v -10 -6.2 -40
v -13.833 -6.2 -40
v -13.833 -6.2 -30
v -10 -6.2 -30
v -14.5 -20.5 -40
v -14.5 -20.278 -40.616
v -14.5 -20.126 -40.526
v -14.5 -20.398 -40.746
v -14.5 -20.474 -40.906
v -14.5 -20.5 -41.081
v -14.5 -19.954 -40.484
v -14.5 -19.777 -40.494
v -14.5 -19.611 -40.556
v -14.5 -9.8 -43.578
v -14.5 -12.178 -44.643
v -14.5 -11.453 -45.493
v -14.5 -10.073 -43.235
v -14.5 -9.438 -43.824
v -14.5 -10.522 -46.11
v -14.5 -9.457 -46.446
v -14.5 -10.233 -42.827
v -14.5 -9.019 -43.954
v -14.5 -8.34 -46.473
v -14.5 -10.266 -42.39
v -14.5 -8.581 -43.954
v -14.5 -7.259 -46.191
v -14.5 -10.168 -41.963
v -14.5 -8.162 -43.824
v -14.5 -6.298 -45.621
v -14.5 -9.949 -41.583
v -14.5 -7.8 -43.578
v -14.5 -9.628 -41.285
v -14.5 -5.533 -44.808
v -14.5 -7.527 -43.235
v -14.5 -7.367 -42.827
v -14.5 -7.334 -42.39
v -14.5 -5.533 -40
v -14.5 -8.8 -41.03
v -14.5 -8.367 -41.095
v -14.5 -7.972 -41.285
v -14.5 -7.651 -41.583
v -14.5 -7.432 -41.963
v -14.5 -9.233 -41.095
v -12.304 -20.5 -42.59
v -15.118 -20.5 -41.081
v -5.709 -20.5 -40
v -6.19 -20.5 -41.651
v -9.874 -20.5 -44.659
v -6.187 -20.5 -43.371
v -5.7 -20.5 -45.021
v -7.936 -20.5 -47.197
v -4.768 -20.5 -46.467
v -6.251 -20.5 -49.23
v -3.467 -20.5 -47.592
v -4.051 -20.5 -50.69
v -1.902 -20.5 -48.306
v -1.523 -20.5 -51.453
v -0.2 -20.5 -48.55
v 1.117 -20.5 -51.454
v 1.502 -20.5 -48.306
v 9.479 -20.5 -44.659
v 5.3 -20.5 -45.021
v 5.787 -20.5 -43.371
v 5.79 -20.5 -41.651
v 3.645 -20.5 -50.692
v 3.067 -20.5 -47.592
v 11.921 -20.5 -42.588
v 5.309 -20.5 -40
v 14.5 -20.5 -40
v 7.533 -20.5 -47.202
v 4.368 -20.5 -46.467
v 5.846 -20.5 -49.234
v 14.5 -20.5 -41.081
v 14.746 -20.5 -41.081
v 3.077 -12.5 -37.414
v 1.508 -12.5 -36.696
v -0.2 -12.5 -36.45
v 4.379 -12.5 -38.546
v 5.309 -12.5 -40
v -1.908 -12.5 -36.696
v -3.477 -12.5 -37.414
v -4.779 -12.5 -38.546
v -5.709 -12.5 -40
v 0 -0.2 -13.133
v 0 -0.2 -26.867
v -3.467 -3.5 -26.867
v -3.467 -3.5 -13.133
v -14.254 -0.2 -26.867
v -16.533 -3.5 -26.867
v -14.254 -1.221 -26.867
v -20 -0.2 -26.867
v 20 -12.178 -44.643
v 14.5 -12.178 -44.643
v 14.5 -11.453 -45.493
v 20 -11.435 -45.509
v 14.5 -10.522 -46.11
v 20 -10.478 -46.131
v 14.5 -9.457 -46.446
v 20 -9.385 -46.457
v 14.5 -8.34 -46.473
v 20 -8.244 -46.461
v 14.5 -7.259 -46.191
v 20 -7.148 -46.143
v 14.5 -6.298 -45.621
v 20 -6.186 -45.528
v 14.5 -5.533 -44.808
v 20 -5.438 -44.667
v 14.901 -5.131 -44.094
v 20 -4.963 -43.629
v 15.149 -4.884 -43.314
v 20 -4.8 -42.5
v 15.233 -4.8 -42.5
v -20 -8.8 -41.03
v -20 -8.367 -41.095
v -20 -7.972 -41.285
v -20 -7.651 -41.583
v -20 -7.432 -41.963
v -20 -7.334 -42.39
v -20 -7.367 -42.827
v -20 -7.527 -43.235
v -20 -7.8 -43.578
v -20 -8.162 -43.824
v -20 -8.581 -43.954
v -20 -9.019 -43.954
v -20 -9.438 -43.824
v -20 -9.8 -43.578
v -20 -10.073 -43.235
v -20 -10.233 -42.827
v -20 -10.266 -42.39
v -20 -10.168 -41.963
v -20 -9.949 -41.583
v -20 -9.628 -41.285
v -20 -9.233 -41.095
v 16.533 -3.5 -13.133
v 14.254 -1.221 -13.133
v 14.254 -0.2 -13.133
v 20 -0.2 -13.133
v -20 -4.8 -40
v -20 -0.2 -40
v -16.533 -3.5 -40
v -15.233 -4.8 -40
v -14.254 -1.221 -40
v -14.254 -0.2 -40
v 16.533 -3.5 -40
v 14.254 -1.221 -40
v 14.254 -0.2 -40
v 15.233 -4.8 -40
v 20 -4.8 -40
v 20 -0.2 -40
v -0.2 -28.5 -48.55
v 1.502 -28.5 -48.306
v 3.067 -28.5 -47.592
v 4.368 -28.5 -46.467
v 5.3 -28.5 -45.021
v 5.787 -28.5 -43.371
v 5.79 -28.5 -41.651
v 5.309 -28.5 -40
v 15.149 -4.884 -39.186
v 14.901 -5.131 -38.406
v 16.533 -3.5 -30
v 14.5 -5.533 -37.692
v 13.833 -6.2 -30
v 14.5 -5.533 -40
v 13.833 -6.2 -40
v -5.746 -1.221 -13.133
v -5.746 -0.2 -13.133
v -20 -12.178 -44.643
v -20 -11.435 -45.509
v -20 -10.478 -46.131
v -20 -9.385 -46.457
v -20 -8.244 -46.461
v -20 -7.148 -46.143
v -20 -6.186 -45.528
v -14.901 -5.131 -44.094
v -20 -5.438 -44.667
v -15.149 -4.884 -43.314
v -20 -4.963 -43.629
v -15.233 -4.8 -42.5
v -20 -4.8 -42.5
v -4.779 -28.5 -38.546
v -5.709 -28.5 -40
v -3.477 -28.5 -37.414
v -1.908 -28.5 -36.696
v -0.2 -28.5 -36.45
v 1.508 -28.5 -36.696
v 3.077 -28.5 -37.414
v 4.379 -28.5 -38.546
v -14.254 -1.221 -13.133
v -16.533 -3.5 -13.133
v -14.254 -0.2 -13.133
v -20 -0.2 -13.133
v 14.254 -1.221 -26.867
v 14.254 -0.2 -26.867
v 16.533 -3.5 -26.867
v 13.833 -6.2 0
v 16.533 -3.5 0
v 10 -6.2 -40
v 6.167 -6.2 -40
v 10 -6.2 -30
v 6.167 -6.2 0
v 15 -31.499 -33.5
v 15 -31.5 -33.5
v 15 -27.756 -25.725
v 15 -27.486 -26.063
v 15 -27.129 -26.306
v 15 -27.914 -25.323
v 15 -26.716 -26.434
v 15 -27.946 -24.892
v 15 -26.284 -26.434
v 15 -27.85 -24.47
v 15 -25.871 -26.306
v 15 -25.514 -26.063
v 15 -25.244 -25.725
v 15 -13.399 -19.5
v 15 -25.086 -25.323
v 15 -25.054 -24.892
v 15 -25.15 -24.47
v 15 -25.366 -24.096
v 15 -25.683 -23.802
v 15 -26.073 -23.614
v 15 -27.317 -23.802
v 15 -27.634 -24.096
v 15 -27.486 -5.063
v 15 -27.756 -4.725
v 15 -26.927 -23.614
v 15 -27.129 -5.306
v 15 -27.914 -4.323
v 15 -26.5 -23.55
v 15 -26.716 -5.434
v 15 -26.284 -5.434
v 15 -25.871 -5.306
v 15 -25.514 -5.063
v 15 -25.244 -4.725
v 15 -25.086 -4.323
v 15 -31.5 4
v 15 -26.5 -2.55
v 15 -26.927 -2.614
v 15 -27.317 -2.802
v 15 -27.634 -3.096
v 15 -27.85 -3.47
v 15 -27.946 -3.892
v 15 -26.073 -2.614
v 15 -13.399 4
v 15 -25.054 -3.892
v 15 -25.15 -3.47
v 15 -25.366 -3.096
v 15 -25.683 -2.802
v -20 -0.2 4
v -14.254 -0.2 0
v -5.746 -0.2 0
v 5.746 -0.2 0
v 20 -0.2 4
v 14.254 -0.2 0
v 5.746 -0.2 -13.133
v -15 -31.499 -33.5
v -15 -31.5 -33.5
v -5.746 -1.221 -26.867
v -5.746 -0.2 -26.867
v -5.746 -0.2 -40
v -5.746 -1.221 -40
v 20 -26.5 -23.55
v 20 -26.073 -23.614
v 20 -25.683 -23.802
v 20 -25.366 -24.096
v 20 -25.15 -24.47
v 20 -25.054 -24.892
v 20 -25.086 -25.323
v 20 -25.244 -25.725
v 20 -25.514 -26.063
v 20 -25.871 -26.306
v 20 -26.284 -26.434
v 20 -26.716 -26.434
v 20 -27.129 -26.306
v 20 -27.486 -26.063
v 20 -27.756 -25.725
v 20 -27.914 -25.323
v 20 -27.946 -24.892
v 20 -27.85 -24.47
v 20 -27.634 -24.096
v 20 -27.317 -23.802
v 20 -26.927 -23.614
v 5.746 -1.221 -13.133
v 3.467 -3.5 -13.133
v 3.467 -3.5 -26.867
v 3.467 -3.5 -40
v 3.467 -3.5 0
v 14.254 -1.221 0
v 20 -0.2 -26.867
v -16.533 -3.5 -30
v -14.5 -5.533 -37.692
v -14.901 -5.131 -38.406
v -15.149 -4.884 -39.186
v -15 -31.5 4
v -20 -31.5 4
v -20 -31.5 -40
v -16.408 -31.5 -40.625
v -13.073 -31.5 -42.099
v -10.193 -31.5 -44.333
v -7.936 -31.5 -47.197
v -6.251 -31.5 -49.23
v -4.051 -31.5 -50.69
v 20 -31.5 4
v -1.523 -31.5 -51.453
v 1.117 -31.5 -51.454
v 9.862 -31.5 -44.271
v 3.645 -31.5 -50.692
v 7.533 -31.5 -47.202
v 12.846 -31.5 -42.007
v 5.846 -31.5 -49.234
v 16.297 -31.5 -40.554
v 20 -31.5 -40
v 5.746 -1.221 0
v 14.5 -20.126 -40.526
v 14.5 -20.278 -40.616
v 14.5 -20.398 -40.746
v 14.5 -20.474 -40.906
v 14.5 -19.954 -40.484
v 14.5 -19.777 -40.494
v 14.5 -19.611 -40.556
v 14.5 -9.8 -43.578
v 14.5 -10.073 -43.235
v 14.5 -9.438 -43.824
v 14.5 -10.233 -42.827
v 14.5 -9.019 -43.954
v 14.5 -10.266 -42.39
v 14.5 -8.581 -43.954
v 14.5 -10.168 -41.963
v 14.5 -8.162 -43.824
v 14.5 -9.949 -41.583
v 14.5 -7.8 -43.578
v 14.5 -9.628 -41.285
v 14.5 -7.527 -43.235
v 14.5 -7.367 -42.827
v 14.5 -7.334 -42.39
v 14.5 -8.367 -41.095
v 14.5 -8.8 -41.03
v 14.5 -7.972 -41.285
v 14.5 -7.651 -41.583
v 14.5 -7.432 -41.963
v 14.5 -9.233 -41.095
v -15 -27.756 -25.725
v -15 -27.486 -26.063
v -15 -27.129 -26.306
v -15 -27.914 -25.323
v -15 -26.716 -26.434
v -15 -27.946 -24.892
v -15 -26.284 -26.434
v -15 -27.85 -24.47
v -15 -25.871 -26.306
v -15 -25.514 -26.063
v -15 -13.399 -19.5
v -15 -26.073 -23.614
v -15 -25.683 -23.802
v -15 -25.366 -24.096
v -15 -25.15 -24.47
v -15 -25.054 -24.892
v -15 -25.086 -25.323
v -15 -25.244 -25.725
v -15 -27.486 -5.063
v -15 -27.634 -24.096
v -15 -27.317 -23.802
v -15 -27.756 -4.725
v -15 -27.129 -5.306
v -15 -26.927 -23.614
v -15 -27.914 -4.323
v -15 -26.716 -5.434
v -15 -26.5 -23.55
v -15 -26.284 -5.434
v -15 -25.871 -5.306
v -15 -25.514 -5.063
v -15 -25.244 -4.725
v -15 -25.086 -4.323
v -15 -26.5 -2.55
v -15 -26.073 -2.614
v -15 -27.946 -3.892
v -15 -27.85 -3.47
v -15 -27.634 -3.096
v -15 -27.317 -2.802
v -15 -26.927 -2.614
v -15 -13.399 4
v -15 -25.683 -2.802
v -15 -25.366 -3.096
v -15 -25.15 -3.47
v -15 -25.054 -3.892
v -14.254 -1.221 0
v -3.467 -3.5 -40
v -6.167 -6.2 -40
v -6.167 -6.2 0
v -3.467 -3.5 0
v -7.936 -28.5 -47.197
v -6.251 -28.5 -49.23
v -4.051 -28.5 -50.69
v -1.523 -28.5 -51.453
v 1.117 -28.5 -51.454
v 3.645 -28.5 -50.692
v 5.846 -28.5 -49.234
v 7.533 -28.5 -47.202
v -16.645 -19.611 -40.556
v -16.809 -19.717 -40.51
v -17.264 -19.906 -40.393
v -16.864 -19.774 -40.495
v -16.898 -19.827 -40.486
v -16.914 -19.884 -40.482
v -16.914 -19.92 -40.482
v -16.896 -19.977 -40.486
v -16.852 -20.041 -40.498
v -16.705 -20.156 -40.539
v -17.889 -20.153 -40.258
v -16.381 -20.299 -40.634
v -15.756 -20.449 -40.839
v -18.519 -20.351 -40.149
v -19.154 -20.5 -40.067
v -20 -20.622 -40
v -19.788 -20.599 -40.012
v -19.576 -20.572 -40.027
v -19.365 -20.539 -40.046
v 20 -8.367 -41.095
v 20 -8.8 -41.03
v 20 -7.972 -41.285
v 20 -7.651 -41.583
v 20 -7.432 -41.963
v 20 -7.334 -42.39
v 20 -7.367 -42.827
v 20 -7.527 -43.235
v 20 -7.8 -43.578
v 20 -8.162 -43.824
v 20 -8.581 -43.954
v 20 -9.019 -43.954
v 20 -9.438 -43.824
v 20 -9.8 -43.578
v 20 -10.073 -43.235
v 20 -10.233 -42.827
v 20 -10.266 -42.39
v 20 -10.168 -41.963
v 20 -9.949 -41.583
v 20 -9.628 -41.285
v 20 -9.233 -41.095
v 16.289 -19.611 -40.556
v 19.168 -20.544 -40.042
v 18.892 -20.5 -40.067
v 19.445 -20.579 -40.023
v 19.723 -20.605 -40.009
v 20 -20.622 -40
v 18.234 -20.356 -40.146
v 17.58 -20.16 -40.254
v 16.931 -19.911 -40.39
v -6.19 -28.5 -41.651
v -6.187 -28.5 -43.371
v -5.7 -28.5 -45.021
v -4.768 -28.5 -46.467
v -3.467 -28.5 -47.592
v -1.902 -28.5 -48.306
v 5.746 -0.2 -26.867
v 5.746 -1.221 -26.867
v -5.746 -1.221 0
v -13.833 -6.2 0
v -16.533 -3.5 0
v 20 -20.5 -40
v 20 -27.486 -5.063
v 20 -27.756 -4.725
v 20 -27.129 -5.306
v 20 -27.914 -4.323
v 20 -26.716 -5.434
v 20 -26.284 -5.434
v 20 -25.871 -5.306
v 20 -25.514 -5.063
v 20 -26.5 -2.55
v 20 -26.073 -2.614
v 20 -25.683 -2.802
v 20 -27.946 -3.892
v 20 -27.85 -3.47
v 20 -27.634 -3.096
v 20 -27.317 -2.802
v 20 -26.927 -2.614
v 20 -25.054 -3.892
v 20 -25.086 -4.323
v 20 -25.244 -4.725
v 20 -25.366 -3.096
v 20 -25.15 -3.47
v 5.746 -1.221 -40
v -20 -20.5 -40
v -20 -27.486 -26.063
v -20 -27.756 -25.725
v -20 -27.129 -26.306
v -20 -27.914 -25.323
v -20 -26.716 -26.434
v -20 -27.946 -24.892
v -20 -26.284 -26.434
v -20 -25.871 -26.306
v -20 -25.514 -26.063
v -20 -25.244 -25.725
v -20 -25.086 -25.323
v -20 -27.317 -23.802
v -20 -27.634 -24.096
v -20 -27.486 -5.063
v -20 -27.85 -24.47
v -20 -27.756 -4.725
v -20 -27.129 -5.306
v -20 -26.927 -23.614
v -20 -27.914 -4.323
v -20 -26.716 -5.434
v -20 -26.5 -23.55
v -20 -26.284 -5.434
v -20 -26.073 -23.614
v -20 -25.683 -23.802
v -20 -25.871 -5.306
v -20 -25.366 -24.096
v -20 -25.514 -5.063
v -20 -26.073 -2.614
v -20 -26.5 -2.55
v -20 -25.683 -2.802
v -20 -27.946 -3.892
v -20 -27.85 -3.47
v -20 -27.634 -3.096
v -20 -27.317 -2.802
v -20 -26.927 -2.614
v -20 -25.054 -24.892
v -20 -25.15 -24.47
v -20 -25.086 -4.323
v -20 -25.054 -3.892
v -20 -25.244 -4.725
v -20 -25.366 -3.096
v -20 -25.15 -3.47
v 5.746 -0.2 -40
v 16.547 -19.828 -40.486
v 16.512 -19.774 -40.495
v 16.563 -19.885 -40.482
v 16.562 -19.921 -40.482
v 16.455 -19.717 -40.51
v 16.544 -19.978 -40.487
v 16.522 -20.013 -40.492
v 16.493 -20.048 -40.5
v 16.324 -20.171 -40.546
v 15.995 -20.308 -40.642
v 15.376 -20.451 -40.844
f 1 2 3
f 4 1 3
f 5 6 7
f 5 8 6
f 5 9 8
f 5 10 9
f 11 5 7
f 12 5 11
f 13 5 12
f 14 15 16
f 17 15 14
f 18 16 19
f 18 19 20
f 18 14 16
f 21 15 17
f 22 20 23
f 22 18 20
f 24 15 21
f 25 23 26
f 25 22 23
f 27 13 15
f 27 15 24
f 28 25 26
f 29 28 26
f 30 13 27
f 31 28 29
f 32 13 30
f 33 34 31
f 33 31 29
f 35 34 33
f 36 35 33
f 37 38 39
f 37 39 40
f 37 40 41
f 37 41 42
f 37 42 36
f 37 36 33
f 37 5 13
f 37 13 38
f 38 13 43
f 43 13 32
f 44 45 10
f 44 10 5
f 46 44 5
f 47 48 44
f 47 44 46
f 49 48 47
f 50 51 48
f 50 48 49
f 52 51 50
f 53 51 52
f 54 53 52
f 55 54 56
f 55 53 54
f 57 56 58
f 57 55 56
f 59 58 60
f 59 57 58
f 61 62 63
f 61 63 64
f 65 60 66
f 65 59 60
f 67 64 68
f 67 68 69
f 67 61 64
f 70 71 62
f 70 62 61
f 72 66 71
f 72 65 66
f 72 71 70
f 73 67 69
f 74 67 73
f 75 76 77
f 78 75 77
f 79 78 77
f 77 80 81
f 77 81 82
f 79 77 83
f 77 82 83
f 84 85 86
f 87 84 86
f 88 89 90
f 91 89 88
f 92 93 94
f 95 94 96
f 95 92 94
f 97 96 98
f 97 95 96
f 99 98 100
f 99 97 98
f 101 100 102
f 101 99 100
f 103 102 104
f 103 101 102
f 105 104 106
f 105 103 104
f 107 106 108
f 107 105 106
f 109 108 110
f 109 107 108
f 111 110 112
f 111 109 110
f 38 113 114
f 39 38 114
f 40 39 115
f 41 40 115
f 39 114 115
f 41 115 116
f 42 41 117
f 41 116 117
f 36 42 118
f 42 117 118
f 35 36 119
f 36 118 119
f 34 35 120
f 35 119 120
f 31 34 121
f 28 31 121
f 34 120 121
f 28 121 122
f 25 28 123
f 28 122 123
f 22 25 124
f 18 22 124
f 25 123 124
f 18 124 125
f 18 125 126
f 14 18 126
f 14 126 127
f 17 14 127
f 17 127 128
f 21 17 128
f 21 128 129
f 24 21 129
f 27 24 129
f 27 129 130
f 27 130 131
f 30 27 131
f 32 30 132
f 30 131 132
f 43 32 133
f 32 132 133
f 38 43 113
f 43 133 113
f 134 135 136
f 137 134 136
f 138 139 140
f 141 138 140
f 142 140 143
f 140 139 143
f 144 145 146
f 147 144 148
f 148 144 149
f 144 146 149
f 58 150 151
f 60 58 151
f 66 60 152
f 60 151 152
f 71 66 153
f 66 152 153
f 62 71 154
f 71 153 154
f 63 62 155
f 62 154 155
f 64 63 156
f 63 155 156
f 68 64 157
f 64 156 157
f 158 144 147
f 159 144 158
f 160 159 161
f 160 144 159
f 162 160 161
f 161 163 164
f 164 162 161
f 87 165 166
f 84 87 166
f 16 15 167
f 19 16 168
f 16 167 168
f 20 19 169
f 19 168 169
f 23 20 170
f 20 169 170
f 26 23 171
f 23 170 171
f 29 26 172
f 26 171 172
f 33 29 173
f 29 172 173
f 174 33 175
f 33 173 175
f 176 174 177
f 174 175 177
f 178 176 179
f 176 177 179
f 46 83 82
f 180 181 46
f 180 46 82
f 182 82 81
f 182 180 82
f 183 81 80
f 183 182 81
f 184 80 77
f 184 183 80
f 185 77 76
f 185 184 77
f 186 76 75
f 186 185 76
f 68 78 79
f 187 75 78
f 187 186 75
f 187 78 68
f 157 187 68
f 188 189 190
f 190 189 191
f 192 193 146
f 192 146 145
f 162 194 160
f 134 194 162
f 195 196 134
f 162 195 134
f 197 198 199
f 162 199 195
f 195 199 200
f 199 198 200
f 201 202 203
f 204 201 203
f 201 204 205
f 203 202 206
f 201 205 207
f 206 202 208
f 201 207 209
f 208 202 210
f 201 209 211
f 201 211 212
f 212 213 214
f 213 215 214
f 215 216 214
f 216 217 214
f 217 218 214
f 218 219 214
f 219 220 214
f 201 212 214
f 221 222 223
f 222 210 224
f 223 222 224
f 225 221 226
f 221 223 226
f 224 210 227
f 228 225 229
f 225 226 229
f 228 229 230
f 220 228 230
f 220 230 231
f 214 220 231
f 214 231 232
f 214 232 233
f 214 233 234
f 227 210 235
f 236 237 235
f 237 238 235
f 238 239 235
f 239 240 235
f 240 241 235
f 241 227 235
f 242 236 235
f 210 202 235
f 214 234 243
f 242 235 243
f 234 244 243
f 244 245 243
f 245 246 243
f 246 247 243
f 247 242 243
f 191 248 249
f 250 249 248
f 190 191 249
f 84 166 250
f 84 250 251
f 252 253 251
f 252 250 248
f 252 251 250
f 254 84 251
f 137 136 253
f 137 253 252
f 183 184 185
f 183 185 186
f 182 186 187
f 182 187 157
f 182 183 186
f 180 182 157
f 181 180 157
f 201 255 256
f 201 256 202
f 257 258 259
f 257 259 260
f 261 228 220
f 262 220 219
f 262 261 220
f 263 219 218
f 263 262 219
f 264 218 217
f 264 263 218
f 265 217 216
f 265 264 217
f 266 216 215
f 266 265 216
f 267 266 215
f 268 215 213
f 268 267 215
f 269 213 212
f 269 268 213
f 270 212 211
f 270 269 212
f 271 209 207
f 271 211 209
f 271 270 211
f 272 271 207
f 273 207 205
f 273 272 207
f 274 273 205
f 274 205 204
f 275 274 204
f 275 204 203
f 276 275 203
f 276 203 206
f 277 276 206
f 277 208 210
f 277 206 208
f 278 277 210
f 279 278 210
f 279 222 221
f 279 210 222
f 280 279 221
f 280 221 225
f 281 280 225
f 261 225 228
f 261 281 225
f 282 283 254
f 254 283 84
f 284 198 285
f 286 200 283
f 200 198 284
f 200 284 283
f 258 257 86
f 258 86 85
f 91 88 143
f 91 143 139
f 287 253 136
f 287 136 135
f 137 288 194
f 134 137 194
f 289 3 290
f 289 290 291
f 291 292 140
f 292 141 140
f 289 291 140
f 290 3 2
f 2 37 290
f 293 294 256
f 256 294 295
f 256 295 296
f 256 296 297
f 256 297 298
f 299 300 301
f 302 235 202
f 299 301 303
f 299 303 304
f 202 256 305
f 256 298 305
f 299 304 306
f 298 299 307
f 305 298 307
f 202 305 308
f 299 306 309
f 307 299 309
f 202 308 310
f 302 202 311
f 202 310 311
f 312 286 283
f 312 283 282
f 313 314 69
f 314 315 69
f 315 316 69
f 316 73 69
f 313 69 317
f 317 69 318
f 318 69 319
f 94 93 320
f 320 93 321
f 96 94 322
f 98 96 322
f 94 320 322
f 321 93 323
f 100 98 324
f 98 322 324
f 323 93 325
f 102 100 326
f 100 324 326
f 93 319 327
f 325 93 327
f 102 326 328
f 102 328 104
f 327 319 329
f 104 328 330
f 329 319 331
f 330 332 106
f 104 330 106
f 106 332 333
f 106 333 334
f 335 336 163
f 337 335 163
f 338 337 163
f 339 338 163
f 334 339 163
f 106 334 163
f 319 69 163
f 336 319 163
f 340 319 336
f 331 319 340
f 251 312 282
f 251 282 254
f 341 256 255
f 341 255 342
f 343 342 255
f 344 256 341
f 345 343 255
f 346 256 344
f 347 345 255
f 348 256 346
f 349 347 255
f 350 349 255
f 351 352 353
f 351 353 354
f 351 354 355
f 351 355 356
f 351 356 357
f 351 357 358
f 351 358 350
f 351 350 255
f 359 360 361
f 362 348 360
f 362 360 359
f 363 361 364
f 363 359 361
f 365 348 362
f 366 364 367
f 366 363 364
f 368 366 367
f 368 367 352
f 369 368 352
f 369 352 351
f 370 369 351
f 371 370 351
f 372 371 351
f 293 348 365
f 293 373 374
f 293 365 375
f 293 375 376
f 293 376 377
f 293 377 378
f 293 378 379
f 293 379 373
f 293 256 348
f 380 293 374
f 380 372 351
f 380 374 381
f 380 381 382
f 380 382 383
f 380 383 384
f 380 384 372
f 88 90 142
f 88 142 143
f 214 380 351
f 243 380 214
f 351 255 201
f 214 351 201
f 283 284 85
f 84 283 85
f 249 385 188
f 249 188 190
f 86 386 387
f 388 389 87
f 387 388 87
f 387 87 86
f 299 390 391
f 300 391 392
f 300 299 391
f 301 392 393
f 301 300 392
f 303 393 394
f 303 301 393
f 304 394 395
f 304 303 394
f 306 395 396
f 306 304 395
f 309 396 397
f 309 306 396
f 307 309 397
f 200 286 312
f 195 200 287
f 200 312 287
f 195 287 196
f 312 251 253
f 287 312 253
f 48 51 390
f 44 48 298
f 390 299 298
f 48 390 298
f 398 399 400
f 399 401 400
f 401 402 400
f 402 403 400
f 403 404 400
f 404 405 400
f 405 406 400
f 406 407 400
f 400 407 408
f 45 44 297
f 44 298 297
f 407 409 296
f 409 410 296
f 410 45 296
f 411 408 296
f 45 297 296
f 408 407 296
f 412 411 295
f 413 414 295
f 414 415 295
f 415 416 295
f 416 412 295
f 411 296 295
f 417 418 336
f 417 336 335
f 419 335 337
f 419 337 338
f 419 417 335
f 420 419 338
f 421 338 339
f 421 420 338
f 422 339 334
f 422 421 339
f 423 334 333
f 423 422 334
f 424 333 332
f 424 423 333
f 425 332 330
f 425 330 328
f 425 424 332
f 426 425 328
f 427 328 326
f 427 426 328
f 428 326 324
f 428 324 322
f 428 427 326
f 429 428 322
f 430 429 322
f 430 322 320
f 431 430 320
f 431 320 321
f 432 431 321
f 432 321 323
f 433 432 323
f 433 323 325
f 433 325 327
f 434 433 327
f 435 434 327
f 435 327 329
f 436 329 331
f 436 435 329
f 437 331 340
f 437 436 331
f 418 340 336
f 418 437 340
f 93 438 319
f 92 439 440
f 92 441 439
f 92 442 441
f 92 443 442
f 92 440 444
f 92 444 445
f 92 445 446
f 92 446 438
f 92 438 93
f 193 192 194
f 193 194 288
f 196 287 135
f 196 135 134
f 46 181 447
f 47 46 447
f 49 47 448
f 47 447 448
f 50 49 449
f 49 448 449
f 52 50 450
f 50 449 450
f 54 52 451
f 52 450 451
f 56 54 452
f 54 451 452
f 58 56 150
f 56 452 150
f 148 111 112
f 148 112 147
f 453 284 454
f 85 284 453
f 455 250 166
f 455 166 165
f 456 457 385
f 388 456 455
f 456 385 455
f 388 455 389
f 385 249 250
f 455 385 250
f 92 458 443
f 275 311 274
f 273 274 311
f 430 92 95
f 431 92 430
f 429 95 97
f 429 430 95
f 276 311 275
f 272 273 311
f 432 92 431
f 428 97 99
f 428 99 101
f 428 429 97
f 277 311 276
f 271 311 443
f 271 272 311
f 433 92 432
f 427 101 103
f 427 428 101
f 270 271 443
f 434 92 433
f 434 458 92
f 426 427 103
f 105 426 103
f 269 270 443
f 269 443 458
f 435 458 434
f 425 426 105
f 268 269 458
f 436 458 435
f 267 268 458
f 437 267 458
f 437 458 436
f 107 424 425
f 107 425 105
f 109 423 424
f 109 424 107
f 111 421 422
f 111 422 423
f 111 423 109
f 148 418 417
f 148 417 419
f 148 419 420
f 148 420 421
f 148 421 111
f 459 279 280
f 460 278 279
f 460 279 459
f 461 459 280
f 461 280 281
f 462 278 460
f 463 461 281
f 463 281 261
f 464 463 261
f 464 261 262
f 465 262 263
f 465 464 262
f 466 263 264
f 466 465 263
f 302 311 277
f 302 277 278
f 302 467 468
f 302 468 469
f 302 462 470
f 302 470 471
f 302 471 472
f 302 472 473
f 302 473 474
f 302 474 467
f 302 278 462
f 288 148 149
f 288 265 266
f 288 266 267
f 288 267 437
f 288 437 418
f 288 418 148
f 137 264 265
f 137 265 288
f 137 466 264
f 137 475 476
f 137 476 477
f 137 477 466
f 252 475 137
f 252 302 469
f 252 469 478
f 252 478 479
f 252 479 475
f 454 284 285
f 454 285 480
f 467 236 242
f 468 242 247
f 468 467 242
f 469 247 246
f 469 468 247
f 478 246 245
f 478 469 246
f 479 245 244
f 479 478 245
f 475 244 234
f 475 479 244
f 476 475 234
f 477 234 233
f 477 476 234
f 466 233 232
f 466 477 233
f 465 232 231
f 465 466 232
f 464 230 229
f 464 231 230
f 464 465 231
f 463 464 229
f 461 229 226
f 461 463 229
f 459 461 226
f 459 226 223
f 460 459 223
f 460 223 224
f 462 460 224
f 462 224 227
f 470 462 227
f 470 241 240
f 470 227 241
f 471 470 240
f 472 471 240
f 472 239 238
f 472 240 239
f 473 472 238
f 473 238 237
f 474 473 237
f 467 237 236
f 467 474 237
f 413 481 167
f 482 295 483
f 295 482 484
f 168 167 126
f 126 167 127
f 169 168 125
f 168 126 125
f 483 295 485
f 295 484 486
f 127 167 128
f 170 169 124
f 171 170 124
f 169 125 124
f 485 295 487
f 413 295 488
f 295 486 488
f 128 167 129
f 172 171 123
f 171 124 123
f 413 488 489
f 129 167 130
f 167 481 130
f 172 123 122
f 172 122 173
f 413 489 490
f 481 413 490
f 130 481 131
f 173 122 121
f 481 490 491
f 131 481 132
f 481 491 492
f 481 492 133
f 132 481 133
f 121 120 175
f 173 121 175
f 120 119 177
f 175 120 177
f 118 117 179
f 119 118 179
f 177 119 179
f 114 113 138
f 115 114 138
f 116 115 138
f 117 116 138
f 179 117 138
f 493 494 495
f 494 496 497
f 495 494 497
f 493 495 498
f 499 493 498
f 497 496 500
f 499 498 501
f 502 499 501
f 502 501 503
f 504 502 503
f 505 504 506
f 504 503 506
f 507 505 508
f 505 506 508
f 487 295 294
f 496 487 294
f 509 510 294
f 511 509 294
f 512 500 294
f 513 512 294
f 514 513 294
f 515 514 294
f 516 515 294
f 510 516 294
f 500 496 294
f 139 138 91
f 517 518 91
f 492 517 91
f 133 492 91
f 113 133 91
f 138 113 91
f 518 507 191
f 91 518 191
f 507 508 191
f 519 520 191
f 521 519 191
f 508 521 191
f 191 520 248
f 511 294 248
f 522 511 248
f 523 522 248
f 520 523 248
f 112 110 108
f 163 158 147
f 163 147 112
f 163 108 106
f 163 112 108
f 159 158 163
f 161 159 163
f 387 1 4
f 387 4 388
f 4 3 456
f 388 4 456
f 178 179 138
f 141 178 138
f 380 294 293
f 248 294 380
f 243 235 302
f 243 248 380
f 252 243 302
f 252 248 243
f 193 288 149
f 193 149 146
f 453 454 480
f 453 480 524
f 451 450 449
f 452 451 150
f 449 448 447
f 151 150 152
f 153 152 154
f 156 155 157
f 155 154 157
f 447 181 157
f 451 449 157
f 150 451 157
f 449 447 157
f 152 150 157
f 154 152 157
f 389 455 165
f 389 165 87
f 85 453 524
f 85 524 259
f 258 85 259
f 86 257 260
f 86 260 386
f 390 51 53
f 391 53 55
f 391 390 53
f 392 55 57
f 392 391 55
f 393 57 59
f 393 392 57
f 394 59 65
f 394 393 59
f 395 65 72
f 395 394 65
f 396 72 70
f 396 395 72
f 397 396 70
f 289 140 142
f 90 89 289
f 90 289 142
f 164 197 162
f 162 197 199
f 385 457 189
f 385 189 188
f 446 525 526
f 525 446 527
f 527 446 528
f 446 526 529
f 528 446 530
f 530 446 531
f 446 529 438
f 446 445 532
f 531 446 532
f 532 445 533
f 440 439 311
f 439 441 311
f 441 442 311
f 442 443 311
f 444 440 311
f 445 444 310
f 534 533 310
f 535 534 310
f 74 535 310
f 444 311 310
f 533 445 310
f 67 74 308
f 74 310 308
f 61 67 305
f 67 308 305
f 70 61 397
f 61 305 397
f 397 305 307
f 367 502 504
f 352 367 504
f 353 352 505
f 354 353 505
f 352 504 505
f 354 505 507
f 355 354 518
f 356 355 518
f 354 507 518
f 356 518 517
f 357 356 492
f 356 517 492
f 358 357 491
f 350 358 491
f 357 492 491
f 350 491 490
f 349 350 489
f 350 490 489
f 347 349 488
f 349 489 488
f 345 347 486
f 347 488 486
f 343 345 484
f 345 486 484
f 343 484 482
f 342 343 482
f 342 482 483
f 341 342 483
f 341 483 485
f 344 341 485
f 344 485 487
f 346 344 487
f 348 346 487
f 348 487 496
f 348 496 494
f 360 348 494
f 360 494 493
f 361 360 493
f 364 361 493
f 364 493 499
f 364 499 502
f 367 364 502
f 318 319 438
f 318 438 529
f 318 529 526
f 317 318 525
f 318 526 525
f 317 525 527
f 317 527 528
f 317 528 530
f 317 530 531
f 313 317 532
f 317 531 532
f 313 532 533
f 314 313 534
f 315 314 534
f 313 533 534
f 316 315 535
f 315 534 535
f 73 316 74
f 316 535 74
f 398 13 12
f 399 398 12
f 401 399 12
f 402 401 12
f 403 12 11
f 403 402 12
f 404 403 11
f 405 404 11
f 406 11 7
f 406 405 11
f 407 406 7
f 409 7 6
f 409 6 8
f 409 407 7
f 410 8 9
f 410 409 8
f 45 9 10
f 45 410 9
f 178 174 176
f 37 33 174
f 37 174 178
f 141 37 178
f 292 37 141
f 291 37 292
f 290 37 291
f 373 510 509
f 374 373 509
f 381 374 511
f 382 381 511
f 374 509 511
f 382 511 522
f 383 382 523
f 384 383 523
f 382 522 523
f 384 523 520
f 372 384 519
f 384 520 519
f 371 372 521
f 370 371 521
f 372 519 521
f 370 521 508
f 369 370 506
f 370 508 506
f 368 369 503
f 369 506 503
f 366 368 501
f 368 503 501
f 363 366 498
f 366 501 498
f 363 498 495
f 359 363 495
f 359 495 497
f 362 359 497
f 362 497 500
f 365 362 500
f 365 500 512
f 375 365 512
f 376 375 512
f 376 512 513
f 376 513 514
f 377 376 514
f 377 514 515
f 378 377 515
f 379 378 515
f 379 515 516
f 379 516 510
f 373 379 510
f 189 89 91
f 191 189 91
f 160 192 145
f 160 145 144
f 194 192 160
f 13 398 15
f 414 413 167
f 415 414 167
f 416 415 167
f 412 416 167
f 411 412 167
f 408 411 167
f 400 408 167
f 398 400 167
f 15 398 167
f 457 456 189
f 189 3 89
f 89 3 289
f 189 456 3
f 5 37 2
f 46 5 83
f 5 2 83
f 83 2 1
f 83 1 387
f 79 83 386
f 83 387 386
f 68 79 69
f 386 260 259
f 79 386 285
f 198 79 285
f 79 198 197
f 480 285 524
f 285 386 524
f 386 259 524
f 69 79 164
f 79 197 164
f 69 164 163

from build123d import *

# Parameters (mm, degrees)
BOSS_EXTRUDE1_DEPTH     = 40
SKETCH2_W               = 13.73333333
SKETCH2_H               = 6
CUT_EXTRUDE1_DEPTH      = 58.827329179
SKETCH3_W               = 40
SKETCH3_H               = 11.8
BOSS_EXTRUDE2_DEPTH     = 4
BOSS_EXTRUDE3_DEPTH     = 13.73333333
SKETCH10_R              = 1.47
BOSS_EXTRUDE7_DEPTH     = 5.5
SKETCH13_W              = 40
SKETCH13_H              = 44
BOSS_EXTRUDE8_DEPTH     = 19.5
CHAMFER2_START          = -20
CHAMFER2_DEPTH          = 5.5
EXTRUDE_THIN1_START     = -3
SKETCH14_R              = 9.05
SKETCH14_R_2            = 6.05
EXTRUDE_THIN1_DEPTH     = 8
BOSS_EXTRUDE9_START     = 3
BOSS_EXTRUDE9_DEPTH     = 3
FILLET1_START           = -31.5
FILLET1_DEPTH           = 11
SKETCH16_W              = 30
SKETCH16_H              = 18.101031733
CUT_EXTRUDE4_DEPTH      = 37.5
CHAMFER1_SIZE           = 14
CHAMFER1_SIZE2          = 18.1
SKETCH17_R              = 1.45
CUT_EXTRUDE5_DEPTH      = 35
SKETCH18_R              = 6.05
CUT_EXTRUDE6_DEPTH      = 16
FILLET2_R               = 0.6
CUT_EXTRUDE7_DEPTH      = 58.690987254
CUT_EXTRUDE7_DEPTH_BACK = 10


with BuildPart() as part:
    # Sketch1 → Boss-Extrude1 (new body)
    with BuildSketch(Plane.XY):
        Polygon((-20, -0.2), (-20, -12), (20, -12), (20, -0.2), (14.253501692, -0.2), (14.253501692, -1.22065898), (16.532842712, -3.5), (13.832842712, -6.2), (6.167157288, -6.2), (3.467157288, -3.5), (5.746498308, -1.22065898), (5.746498308, -0.2), (-5.746498308, -0.2), (-5.746498308, -1.22065898), (-3.467157288, -3.5), (-6.167157288, -6.2), (-13.832842712, -6.2), (-16.532842712, -3.5), (-14.253501692, -1.22065898), (-14.253501692, -0.2), align=None)
    extrude(amount=-BOSS_EXTRUDE1_DEPTH)

    # Sketch2 → Cut-Extrude1 (cut, through all)
    with BuildSketch(Plane.ZY.offset(20)):
        with Locations((-20, -3.2)):
            Rectangle(SKETCH2_W, SKETCH2_H)
    extrude(amount=-CUT_EXTRUDE1_DEPTH, mode=Mode.SUBTRACT)

    # Sketch3 → Boss-Extrude2 (add)
    with BuildSketch(Plane.XY):
        with Locations((0, -6.1)):
            Rectangle(SKETCH3_W, SKETCH3_H)
    extrude(amount=BOSS_EXTRUDE2_DEPTH)

    # Sketch4 → Boss-Extrude3 (add)
    with BuildSketch(Plane.XY.offset(-26.866666665)):
        Polygon((-20, -0.2), (-20, -6.2), (-13.832842712, -6.2), (-16.532842712, -3.5), align=None)
        Polygon((-6.167157288, -6.2), (6.167157288, -6.2), (3.467157288, -3.5), (0, -0.2), (-3.467157288, -3.5), align=None)
        Polygon((13.832842712, -6.2), (20, -6.2), (20, -0.2), (16.532842712, -3.5), align=None)
    extrude(amount=BOSS_EXTRUDE3_DEPTH)

    # Sketch10 → Boss-Extrude7 (add)
    with BuildSketch(Plane.ZY.offset(20)):
        with BuildLine():
            Line((-40, -12.8), (-42.5, -12.8))
            ThreePointArc((-42.5, -12.8), (-46.5, -8.8), (-42.5, -4.8))
            Line((-42.5, -4.8), (-40, -4.8))
            ThreePointArc((-40, -4.8), (-36, -8.8), (-40, -12.8))
        make_face()
        with Locations((-42.5, -8.8)):
            Circle(SKETCH10_R, mode=Mode.SUBTRACT)
    boss_extrude7 = extrude(amount=-BOSS_EXTRUDE7_DEPTH)

    # Sketch13 → Boss-Extrude8 (add)
    with BuildSketch(Plane.XZ.offset(12)):
        with Locations((0, -18)):
            Rectangle(SKETCH13_W, SKETCH13_H)
    extrude(amount=BOSS_EXTRUDE8_DEPTH)

    # Chamfer2: read off the stored shape, not the designer's step
    # Chamfer2 outline → Chamfer2 (add)
    with BuildSketch(Plane.YZ.offset(CHAMFER2_START)):
        with BuildLine():
            Line((-20.621590418, -40), (-12.177597262, -44.642857143))
            ThreePointArc((-12.177597262, -44.642857143), (-12.641249084, -43.615708508), (-12.8, -42.5))
            Line((-12.8, -42.5), (-12.8, -40))
            Line((-12.8, -40), (-20.621590418, -40))
        make_face()
    chamfer2 = extrude(amount=CHAMFER2_DEPTH)

    # Mirror1: Boss-Extrude7, Chamfer2 across plane
    add(boss_extrude7.mirror(Plane(origin=(0, 0, 0), x_dir=(0, 0, 1), z_dir=(1, 0, 0))))
    add(chamfer2.mirror(Plane(origin=(0, 0, 0), x_dir=(0, 0, 1), z_dir=(1, 0, 0))))

    # Sketch14 → Extrude-Thin1 (add)
    with BuildSketch(Plane.XZ.offset(31.5).offset(EXTRUDE_THIN1_START)):
        with Locations((-0.2, -42.5)):
            Circle(SKETCH14_R)
        with Locations((-0.2, -42.5)):
            Circle(SKETCH14_R_2, mode=Mode.SUBTRACT)
    extrude(amount=-EXTRUDE_THIN1_DEPTH)

    # Sketch15 → Boss-Extrude9 (add)
    with BuildSketch(Plane.XZ.offset(28.5).offset(BOSS_EXTRUDE9_START)):
        with BuildLine():
            Line((8.497844561, -40), (-8.897844561, -40))
            ThreePointArc((-8.897844561, -40), (-0.2, -51.55), (8.497844561, -40))
        make_face()
    extrude(amount=-BOSS_EXTRUDE9_DEPTH)

    # Fillet1: read off the stored shape, not the designer's step
    # Fillet1 outline → Fillet1 (add)
    with BuildSketch(Plane(origin=(0, 0, 0), x_dir=(1, 0, 0), z_dir=(0, 1, 0)).offset(FILLET1_START)):
        with BuildLine():
            ThreePointArc((20, 40), (12.845609752, 42.00741501), (7.532507128, 47.202215809))
            ThreePointArc((7.532507128, 47.202215809), (8.769787751, 43.7022511), (8.497844561, 40))
            Line((8.497844561, 40), (20, 40))
        make_face()
        with BuildLine():
            ThreePointArc((-8.897844561, 40), (-9.170229006, 43.698954374), (-7.935961427, 47.196530719))
            ThreePointArc((-7.935961427, 47.196530719), (-13.07347783, 42.098748758), (-20, 40))
            Line((-20, 40), (-8.897844561, 40))
        make_face()
    extrude(amount=FILLET1_DEPTH)

    # Sketch16 → Cut-Extrude4 (cut)
    with BuildSketch(Plane.XY.offset(4)):
        with Locations((0, -22.449484134)):
            Rectangle(SKETCH16_W, SKETCH16_H)
    extrude(amount=-CUT_EXTRUDE4_DEPTH, mode=Mode.SUBTRACT)

    # Chamfer1
    chamfer1_edges = [part.edges().sort_by_distance(p)[0] for p in [
        (0, -13.398968267, -33.5),
    ]]
    chamfer1_side = [part.faces().sort_by_distance(p)[0] for p in [
        (0, -13.398968267, -14.75),
    ]]
    chamfer(chamfer1_edges, length=CHAMFER1_SIZE, length2=CHAMFER1_SIZE2, reference=chamfer1_side[0])

    # Sketch17 → Cut-Extrude5 (cut)
    with BuildSketch(Plane.ZY.offset(20)):
        with Locations((-4, -26.5)):
            Circle(SKETCH17_R)
        with Locations((-25, -26.5)):
            Circle(SKETCH17_R)
    cut_extrude5 = extrude(amount=-CUT_EXTRUDE5_DEPTH, mode=Mode.SUBTRACT)

    # Mirror3: Cut-Extrude5 across plane
    add(cut_extrude5.mirror(Plane(origin=(0, 0, 0), x_dir=(0, 0, 1), z_dir=(1, 0, 0))), mode=Mode.SUBTRACT)

    # Sketch18 → Cut-Extrude6 (cut)
    with BuildSketch(Plane(origin=(0, -28.5, 0), x_dir=(1, 0, 0), z_dir=(0, 1, 0))):
        with Locations(Location((-0.2, 42.5, 0), (0, 0, 90))):
            Circle(SKETCH18_R)
    extrude(amount=CUT_EXTRUDE6_DEPTH, mode=Mode.SUBTRACT)

    # Fillet2
    fillet2_edges = [part.edges().sort_by_distance(p)[0] for p in [
        (16.695998577, -20.5, -40.066855447),
        (-16.826940077, -20.5, -40.066855447),
    ]]
    fillet(fillet2_edges, radius=FILLET2_R)

    # Sketch19 → Cut-Extrude7 (cut, two sides: drawn at the far end of the back side and taken through both)
    with BuildSketch(Plane(origin=(0, 0, -40), x_dir=(-1, 0, 0), z_dir=(0, 0, -1)).offset(-CUT_EXTRUDE7_DEPTH_BACK)):
        Polygon((16.532842712, -3.5), (15.232842712, -4.8), (14.5, -5.532842712), (13.832842712, -6.2), (10, -6.2), (10, -3.5), align=None)
        Polygon((-13.832842712, -6.2), (-14.5, -5.532842712), (-15.232842712, -4.8), (-16.532842712, -3.5), (-10, -3.5), (-10, -6.2), align=None)
    extrude(amount=CUT_EXTRUDE7_DEPTH + CUT_EXTRUDE7_DEPTH_BACK, mode=Mode.SUBTRACT)


solid = part.part
